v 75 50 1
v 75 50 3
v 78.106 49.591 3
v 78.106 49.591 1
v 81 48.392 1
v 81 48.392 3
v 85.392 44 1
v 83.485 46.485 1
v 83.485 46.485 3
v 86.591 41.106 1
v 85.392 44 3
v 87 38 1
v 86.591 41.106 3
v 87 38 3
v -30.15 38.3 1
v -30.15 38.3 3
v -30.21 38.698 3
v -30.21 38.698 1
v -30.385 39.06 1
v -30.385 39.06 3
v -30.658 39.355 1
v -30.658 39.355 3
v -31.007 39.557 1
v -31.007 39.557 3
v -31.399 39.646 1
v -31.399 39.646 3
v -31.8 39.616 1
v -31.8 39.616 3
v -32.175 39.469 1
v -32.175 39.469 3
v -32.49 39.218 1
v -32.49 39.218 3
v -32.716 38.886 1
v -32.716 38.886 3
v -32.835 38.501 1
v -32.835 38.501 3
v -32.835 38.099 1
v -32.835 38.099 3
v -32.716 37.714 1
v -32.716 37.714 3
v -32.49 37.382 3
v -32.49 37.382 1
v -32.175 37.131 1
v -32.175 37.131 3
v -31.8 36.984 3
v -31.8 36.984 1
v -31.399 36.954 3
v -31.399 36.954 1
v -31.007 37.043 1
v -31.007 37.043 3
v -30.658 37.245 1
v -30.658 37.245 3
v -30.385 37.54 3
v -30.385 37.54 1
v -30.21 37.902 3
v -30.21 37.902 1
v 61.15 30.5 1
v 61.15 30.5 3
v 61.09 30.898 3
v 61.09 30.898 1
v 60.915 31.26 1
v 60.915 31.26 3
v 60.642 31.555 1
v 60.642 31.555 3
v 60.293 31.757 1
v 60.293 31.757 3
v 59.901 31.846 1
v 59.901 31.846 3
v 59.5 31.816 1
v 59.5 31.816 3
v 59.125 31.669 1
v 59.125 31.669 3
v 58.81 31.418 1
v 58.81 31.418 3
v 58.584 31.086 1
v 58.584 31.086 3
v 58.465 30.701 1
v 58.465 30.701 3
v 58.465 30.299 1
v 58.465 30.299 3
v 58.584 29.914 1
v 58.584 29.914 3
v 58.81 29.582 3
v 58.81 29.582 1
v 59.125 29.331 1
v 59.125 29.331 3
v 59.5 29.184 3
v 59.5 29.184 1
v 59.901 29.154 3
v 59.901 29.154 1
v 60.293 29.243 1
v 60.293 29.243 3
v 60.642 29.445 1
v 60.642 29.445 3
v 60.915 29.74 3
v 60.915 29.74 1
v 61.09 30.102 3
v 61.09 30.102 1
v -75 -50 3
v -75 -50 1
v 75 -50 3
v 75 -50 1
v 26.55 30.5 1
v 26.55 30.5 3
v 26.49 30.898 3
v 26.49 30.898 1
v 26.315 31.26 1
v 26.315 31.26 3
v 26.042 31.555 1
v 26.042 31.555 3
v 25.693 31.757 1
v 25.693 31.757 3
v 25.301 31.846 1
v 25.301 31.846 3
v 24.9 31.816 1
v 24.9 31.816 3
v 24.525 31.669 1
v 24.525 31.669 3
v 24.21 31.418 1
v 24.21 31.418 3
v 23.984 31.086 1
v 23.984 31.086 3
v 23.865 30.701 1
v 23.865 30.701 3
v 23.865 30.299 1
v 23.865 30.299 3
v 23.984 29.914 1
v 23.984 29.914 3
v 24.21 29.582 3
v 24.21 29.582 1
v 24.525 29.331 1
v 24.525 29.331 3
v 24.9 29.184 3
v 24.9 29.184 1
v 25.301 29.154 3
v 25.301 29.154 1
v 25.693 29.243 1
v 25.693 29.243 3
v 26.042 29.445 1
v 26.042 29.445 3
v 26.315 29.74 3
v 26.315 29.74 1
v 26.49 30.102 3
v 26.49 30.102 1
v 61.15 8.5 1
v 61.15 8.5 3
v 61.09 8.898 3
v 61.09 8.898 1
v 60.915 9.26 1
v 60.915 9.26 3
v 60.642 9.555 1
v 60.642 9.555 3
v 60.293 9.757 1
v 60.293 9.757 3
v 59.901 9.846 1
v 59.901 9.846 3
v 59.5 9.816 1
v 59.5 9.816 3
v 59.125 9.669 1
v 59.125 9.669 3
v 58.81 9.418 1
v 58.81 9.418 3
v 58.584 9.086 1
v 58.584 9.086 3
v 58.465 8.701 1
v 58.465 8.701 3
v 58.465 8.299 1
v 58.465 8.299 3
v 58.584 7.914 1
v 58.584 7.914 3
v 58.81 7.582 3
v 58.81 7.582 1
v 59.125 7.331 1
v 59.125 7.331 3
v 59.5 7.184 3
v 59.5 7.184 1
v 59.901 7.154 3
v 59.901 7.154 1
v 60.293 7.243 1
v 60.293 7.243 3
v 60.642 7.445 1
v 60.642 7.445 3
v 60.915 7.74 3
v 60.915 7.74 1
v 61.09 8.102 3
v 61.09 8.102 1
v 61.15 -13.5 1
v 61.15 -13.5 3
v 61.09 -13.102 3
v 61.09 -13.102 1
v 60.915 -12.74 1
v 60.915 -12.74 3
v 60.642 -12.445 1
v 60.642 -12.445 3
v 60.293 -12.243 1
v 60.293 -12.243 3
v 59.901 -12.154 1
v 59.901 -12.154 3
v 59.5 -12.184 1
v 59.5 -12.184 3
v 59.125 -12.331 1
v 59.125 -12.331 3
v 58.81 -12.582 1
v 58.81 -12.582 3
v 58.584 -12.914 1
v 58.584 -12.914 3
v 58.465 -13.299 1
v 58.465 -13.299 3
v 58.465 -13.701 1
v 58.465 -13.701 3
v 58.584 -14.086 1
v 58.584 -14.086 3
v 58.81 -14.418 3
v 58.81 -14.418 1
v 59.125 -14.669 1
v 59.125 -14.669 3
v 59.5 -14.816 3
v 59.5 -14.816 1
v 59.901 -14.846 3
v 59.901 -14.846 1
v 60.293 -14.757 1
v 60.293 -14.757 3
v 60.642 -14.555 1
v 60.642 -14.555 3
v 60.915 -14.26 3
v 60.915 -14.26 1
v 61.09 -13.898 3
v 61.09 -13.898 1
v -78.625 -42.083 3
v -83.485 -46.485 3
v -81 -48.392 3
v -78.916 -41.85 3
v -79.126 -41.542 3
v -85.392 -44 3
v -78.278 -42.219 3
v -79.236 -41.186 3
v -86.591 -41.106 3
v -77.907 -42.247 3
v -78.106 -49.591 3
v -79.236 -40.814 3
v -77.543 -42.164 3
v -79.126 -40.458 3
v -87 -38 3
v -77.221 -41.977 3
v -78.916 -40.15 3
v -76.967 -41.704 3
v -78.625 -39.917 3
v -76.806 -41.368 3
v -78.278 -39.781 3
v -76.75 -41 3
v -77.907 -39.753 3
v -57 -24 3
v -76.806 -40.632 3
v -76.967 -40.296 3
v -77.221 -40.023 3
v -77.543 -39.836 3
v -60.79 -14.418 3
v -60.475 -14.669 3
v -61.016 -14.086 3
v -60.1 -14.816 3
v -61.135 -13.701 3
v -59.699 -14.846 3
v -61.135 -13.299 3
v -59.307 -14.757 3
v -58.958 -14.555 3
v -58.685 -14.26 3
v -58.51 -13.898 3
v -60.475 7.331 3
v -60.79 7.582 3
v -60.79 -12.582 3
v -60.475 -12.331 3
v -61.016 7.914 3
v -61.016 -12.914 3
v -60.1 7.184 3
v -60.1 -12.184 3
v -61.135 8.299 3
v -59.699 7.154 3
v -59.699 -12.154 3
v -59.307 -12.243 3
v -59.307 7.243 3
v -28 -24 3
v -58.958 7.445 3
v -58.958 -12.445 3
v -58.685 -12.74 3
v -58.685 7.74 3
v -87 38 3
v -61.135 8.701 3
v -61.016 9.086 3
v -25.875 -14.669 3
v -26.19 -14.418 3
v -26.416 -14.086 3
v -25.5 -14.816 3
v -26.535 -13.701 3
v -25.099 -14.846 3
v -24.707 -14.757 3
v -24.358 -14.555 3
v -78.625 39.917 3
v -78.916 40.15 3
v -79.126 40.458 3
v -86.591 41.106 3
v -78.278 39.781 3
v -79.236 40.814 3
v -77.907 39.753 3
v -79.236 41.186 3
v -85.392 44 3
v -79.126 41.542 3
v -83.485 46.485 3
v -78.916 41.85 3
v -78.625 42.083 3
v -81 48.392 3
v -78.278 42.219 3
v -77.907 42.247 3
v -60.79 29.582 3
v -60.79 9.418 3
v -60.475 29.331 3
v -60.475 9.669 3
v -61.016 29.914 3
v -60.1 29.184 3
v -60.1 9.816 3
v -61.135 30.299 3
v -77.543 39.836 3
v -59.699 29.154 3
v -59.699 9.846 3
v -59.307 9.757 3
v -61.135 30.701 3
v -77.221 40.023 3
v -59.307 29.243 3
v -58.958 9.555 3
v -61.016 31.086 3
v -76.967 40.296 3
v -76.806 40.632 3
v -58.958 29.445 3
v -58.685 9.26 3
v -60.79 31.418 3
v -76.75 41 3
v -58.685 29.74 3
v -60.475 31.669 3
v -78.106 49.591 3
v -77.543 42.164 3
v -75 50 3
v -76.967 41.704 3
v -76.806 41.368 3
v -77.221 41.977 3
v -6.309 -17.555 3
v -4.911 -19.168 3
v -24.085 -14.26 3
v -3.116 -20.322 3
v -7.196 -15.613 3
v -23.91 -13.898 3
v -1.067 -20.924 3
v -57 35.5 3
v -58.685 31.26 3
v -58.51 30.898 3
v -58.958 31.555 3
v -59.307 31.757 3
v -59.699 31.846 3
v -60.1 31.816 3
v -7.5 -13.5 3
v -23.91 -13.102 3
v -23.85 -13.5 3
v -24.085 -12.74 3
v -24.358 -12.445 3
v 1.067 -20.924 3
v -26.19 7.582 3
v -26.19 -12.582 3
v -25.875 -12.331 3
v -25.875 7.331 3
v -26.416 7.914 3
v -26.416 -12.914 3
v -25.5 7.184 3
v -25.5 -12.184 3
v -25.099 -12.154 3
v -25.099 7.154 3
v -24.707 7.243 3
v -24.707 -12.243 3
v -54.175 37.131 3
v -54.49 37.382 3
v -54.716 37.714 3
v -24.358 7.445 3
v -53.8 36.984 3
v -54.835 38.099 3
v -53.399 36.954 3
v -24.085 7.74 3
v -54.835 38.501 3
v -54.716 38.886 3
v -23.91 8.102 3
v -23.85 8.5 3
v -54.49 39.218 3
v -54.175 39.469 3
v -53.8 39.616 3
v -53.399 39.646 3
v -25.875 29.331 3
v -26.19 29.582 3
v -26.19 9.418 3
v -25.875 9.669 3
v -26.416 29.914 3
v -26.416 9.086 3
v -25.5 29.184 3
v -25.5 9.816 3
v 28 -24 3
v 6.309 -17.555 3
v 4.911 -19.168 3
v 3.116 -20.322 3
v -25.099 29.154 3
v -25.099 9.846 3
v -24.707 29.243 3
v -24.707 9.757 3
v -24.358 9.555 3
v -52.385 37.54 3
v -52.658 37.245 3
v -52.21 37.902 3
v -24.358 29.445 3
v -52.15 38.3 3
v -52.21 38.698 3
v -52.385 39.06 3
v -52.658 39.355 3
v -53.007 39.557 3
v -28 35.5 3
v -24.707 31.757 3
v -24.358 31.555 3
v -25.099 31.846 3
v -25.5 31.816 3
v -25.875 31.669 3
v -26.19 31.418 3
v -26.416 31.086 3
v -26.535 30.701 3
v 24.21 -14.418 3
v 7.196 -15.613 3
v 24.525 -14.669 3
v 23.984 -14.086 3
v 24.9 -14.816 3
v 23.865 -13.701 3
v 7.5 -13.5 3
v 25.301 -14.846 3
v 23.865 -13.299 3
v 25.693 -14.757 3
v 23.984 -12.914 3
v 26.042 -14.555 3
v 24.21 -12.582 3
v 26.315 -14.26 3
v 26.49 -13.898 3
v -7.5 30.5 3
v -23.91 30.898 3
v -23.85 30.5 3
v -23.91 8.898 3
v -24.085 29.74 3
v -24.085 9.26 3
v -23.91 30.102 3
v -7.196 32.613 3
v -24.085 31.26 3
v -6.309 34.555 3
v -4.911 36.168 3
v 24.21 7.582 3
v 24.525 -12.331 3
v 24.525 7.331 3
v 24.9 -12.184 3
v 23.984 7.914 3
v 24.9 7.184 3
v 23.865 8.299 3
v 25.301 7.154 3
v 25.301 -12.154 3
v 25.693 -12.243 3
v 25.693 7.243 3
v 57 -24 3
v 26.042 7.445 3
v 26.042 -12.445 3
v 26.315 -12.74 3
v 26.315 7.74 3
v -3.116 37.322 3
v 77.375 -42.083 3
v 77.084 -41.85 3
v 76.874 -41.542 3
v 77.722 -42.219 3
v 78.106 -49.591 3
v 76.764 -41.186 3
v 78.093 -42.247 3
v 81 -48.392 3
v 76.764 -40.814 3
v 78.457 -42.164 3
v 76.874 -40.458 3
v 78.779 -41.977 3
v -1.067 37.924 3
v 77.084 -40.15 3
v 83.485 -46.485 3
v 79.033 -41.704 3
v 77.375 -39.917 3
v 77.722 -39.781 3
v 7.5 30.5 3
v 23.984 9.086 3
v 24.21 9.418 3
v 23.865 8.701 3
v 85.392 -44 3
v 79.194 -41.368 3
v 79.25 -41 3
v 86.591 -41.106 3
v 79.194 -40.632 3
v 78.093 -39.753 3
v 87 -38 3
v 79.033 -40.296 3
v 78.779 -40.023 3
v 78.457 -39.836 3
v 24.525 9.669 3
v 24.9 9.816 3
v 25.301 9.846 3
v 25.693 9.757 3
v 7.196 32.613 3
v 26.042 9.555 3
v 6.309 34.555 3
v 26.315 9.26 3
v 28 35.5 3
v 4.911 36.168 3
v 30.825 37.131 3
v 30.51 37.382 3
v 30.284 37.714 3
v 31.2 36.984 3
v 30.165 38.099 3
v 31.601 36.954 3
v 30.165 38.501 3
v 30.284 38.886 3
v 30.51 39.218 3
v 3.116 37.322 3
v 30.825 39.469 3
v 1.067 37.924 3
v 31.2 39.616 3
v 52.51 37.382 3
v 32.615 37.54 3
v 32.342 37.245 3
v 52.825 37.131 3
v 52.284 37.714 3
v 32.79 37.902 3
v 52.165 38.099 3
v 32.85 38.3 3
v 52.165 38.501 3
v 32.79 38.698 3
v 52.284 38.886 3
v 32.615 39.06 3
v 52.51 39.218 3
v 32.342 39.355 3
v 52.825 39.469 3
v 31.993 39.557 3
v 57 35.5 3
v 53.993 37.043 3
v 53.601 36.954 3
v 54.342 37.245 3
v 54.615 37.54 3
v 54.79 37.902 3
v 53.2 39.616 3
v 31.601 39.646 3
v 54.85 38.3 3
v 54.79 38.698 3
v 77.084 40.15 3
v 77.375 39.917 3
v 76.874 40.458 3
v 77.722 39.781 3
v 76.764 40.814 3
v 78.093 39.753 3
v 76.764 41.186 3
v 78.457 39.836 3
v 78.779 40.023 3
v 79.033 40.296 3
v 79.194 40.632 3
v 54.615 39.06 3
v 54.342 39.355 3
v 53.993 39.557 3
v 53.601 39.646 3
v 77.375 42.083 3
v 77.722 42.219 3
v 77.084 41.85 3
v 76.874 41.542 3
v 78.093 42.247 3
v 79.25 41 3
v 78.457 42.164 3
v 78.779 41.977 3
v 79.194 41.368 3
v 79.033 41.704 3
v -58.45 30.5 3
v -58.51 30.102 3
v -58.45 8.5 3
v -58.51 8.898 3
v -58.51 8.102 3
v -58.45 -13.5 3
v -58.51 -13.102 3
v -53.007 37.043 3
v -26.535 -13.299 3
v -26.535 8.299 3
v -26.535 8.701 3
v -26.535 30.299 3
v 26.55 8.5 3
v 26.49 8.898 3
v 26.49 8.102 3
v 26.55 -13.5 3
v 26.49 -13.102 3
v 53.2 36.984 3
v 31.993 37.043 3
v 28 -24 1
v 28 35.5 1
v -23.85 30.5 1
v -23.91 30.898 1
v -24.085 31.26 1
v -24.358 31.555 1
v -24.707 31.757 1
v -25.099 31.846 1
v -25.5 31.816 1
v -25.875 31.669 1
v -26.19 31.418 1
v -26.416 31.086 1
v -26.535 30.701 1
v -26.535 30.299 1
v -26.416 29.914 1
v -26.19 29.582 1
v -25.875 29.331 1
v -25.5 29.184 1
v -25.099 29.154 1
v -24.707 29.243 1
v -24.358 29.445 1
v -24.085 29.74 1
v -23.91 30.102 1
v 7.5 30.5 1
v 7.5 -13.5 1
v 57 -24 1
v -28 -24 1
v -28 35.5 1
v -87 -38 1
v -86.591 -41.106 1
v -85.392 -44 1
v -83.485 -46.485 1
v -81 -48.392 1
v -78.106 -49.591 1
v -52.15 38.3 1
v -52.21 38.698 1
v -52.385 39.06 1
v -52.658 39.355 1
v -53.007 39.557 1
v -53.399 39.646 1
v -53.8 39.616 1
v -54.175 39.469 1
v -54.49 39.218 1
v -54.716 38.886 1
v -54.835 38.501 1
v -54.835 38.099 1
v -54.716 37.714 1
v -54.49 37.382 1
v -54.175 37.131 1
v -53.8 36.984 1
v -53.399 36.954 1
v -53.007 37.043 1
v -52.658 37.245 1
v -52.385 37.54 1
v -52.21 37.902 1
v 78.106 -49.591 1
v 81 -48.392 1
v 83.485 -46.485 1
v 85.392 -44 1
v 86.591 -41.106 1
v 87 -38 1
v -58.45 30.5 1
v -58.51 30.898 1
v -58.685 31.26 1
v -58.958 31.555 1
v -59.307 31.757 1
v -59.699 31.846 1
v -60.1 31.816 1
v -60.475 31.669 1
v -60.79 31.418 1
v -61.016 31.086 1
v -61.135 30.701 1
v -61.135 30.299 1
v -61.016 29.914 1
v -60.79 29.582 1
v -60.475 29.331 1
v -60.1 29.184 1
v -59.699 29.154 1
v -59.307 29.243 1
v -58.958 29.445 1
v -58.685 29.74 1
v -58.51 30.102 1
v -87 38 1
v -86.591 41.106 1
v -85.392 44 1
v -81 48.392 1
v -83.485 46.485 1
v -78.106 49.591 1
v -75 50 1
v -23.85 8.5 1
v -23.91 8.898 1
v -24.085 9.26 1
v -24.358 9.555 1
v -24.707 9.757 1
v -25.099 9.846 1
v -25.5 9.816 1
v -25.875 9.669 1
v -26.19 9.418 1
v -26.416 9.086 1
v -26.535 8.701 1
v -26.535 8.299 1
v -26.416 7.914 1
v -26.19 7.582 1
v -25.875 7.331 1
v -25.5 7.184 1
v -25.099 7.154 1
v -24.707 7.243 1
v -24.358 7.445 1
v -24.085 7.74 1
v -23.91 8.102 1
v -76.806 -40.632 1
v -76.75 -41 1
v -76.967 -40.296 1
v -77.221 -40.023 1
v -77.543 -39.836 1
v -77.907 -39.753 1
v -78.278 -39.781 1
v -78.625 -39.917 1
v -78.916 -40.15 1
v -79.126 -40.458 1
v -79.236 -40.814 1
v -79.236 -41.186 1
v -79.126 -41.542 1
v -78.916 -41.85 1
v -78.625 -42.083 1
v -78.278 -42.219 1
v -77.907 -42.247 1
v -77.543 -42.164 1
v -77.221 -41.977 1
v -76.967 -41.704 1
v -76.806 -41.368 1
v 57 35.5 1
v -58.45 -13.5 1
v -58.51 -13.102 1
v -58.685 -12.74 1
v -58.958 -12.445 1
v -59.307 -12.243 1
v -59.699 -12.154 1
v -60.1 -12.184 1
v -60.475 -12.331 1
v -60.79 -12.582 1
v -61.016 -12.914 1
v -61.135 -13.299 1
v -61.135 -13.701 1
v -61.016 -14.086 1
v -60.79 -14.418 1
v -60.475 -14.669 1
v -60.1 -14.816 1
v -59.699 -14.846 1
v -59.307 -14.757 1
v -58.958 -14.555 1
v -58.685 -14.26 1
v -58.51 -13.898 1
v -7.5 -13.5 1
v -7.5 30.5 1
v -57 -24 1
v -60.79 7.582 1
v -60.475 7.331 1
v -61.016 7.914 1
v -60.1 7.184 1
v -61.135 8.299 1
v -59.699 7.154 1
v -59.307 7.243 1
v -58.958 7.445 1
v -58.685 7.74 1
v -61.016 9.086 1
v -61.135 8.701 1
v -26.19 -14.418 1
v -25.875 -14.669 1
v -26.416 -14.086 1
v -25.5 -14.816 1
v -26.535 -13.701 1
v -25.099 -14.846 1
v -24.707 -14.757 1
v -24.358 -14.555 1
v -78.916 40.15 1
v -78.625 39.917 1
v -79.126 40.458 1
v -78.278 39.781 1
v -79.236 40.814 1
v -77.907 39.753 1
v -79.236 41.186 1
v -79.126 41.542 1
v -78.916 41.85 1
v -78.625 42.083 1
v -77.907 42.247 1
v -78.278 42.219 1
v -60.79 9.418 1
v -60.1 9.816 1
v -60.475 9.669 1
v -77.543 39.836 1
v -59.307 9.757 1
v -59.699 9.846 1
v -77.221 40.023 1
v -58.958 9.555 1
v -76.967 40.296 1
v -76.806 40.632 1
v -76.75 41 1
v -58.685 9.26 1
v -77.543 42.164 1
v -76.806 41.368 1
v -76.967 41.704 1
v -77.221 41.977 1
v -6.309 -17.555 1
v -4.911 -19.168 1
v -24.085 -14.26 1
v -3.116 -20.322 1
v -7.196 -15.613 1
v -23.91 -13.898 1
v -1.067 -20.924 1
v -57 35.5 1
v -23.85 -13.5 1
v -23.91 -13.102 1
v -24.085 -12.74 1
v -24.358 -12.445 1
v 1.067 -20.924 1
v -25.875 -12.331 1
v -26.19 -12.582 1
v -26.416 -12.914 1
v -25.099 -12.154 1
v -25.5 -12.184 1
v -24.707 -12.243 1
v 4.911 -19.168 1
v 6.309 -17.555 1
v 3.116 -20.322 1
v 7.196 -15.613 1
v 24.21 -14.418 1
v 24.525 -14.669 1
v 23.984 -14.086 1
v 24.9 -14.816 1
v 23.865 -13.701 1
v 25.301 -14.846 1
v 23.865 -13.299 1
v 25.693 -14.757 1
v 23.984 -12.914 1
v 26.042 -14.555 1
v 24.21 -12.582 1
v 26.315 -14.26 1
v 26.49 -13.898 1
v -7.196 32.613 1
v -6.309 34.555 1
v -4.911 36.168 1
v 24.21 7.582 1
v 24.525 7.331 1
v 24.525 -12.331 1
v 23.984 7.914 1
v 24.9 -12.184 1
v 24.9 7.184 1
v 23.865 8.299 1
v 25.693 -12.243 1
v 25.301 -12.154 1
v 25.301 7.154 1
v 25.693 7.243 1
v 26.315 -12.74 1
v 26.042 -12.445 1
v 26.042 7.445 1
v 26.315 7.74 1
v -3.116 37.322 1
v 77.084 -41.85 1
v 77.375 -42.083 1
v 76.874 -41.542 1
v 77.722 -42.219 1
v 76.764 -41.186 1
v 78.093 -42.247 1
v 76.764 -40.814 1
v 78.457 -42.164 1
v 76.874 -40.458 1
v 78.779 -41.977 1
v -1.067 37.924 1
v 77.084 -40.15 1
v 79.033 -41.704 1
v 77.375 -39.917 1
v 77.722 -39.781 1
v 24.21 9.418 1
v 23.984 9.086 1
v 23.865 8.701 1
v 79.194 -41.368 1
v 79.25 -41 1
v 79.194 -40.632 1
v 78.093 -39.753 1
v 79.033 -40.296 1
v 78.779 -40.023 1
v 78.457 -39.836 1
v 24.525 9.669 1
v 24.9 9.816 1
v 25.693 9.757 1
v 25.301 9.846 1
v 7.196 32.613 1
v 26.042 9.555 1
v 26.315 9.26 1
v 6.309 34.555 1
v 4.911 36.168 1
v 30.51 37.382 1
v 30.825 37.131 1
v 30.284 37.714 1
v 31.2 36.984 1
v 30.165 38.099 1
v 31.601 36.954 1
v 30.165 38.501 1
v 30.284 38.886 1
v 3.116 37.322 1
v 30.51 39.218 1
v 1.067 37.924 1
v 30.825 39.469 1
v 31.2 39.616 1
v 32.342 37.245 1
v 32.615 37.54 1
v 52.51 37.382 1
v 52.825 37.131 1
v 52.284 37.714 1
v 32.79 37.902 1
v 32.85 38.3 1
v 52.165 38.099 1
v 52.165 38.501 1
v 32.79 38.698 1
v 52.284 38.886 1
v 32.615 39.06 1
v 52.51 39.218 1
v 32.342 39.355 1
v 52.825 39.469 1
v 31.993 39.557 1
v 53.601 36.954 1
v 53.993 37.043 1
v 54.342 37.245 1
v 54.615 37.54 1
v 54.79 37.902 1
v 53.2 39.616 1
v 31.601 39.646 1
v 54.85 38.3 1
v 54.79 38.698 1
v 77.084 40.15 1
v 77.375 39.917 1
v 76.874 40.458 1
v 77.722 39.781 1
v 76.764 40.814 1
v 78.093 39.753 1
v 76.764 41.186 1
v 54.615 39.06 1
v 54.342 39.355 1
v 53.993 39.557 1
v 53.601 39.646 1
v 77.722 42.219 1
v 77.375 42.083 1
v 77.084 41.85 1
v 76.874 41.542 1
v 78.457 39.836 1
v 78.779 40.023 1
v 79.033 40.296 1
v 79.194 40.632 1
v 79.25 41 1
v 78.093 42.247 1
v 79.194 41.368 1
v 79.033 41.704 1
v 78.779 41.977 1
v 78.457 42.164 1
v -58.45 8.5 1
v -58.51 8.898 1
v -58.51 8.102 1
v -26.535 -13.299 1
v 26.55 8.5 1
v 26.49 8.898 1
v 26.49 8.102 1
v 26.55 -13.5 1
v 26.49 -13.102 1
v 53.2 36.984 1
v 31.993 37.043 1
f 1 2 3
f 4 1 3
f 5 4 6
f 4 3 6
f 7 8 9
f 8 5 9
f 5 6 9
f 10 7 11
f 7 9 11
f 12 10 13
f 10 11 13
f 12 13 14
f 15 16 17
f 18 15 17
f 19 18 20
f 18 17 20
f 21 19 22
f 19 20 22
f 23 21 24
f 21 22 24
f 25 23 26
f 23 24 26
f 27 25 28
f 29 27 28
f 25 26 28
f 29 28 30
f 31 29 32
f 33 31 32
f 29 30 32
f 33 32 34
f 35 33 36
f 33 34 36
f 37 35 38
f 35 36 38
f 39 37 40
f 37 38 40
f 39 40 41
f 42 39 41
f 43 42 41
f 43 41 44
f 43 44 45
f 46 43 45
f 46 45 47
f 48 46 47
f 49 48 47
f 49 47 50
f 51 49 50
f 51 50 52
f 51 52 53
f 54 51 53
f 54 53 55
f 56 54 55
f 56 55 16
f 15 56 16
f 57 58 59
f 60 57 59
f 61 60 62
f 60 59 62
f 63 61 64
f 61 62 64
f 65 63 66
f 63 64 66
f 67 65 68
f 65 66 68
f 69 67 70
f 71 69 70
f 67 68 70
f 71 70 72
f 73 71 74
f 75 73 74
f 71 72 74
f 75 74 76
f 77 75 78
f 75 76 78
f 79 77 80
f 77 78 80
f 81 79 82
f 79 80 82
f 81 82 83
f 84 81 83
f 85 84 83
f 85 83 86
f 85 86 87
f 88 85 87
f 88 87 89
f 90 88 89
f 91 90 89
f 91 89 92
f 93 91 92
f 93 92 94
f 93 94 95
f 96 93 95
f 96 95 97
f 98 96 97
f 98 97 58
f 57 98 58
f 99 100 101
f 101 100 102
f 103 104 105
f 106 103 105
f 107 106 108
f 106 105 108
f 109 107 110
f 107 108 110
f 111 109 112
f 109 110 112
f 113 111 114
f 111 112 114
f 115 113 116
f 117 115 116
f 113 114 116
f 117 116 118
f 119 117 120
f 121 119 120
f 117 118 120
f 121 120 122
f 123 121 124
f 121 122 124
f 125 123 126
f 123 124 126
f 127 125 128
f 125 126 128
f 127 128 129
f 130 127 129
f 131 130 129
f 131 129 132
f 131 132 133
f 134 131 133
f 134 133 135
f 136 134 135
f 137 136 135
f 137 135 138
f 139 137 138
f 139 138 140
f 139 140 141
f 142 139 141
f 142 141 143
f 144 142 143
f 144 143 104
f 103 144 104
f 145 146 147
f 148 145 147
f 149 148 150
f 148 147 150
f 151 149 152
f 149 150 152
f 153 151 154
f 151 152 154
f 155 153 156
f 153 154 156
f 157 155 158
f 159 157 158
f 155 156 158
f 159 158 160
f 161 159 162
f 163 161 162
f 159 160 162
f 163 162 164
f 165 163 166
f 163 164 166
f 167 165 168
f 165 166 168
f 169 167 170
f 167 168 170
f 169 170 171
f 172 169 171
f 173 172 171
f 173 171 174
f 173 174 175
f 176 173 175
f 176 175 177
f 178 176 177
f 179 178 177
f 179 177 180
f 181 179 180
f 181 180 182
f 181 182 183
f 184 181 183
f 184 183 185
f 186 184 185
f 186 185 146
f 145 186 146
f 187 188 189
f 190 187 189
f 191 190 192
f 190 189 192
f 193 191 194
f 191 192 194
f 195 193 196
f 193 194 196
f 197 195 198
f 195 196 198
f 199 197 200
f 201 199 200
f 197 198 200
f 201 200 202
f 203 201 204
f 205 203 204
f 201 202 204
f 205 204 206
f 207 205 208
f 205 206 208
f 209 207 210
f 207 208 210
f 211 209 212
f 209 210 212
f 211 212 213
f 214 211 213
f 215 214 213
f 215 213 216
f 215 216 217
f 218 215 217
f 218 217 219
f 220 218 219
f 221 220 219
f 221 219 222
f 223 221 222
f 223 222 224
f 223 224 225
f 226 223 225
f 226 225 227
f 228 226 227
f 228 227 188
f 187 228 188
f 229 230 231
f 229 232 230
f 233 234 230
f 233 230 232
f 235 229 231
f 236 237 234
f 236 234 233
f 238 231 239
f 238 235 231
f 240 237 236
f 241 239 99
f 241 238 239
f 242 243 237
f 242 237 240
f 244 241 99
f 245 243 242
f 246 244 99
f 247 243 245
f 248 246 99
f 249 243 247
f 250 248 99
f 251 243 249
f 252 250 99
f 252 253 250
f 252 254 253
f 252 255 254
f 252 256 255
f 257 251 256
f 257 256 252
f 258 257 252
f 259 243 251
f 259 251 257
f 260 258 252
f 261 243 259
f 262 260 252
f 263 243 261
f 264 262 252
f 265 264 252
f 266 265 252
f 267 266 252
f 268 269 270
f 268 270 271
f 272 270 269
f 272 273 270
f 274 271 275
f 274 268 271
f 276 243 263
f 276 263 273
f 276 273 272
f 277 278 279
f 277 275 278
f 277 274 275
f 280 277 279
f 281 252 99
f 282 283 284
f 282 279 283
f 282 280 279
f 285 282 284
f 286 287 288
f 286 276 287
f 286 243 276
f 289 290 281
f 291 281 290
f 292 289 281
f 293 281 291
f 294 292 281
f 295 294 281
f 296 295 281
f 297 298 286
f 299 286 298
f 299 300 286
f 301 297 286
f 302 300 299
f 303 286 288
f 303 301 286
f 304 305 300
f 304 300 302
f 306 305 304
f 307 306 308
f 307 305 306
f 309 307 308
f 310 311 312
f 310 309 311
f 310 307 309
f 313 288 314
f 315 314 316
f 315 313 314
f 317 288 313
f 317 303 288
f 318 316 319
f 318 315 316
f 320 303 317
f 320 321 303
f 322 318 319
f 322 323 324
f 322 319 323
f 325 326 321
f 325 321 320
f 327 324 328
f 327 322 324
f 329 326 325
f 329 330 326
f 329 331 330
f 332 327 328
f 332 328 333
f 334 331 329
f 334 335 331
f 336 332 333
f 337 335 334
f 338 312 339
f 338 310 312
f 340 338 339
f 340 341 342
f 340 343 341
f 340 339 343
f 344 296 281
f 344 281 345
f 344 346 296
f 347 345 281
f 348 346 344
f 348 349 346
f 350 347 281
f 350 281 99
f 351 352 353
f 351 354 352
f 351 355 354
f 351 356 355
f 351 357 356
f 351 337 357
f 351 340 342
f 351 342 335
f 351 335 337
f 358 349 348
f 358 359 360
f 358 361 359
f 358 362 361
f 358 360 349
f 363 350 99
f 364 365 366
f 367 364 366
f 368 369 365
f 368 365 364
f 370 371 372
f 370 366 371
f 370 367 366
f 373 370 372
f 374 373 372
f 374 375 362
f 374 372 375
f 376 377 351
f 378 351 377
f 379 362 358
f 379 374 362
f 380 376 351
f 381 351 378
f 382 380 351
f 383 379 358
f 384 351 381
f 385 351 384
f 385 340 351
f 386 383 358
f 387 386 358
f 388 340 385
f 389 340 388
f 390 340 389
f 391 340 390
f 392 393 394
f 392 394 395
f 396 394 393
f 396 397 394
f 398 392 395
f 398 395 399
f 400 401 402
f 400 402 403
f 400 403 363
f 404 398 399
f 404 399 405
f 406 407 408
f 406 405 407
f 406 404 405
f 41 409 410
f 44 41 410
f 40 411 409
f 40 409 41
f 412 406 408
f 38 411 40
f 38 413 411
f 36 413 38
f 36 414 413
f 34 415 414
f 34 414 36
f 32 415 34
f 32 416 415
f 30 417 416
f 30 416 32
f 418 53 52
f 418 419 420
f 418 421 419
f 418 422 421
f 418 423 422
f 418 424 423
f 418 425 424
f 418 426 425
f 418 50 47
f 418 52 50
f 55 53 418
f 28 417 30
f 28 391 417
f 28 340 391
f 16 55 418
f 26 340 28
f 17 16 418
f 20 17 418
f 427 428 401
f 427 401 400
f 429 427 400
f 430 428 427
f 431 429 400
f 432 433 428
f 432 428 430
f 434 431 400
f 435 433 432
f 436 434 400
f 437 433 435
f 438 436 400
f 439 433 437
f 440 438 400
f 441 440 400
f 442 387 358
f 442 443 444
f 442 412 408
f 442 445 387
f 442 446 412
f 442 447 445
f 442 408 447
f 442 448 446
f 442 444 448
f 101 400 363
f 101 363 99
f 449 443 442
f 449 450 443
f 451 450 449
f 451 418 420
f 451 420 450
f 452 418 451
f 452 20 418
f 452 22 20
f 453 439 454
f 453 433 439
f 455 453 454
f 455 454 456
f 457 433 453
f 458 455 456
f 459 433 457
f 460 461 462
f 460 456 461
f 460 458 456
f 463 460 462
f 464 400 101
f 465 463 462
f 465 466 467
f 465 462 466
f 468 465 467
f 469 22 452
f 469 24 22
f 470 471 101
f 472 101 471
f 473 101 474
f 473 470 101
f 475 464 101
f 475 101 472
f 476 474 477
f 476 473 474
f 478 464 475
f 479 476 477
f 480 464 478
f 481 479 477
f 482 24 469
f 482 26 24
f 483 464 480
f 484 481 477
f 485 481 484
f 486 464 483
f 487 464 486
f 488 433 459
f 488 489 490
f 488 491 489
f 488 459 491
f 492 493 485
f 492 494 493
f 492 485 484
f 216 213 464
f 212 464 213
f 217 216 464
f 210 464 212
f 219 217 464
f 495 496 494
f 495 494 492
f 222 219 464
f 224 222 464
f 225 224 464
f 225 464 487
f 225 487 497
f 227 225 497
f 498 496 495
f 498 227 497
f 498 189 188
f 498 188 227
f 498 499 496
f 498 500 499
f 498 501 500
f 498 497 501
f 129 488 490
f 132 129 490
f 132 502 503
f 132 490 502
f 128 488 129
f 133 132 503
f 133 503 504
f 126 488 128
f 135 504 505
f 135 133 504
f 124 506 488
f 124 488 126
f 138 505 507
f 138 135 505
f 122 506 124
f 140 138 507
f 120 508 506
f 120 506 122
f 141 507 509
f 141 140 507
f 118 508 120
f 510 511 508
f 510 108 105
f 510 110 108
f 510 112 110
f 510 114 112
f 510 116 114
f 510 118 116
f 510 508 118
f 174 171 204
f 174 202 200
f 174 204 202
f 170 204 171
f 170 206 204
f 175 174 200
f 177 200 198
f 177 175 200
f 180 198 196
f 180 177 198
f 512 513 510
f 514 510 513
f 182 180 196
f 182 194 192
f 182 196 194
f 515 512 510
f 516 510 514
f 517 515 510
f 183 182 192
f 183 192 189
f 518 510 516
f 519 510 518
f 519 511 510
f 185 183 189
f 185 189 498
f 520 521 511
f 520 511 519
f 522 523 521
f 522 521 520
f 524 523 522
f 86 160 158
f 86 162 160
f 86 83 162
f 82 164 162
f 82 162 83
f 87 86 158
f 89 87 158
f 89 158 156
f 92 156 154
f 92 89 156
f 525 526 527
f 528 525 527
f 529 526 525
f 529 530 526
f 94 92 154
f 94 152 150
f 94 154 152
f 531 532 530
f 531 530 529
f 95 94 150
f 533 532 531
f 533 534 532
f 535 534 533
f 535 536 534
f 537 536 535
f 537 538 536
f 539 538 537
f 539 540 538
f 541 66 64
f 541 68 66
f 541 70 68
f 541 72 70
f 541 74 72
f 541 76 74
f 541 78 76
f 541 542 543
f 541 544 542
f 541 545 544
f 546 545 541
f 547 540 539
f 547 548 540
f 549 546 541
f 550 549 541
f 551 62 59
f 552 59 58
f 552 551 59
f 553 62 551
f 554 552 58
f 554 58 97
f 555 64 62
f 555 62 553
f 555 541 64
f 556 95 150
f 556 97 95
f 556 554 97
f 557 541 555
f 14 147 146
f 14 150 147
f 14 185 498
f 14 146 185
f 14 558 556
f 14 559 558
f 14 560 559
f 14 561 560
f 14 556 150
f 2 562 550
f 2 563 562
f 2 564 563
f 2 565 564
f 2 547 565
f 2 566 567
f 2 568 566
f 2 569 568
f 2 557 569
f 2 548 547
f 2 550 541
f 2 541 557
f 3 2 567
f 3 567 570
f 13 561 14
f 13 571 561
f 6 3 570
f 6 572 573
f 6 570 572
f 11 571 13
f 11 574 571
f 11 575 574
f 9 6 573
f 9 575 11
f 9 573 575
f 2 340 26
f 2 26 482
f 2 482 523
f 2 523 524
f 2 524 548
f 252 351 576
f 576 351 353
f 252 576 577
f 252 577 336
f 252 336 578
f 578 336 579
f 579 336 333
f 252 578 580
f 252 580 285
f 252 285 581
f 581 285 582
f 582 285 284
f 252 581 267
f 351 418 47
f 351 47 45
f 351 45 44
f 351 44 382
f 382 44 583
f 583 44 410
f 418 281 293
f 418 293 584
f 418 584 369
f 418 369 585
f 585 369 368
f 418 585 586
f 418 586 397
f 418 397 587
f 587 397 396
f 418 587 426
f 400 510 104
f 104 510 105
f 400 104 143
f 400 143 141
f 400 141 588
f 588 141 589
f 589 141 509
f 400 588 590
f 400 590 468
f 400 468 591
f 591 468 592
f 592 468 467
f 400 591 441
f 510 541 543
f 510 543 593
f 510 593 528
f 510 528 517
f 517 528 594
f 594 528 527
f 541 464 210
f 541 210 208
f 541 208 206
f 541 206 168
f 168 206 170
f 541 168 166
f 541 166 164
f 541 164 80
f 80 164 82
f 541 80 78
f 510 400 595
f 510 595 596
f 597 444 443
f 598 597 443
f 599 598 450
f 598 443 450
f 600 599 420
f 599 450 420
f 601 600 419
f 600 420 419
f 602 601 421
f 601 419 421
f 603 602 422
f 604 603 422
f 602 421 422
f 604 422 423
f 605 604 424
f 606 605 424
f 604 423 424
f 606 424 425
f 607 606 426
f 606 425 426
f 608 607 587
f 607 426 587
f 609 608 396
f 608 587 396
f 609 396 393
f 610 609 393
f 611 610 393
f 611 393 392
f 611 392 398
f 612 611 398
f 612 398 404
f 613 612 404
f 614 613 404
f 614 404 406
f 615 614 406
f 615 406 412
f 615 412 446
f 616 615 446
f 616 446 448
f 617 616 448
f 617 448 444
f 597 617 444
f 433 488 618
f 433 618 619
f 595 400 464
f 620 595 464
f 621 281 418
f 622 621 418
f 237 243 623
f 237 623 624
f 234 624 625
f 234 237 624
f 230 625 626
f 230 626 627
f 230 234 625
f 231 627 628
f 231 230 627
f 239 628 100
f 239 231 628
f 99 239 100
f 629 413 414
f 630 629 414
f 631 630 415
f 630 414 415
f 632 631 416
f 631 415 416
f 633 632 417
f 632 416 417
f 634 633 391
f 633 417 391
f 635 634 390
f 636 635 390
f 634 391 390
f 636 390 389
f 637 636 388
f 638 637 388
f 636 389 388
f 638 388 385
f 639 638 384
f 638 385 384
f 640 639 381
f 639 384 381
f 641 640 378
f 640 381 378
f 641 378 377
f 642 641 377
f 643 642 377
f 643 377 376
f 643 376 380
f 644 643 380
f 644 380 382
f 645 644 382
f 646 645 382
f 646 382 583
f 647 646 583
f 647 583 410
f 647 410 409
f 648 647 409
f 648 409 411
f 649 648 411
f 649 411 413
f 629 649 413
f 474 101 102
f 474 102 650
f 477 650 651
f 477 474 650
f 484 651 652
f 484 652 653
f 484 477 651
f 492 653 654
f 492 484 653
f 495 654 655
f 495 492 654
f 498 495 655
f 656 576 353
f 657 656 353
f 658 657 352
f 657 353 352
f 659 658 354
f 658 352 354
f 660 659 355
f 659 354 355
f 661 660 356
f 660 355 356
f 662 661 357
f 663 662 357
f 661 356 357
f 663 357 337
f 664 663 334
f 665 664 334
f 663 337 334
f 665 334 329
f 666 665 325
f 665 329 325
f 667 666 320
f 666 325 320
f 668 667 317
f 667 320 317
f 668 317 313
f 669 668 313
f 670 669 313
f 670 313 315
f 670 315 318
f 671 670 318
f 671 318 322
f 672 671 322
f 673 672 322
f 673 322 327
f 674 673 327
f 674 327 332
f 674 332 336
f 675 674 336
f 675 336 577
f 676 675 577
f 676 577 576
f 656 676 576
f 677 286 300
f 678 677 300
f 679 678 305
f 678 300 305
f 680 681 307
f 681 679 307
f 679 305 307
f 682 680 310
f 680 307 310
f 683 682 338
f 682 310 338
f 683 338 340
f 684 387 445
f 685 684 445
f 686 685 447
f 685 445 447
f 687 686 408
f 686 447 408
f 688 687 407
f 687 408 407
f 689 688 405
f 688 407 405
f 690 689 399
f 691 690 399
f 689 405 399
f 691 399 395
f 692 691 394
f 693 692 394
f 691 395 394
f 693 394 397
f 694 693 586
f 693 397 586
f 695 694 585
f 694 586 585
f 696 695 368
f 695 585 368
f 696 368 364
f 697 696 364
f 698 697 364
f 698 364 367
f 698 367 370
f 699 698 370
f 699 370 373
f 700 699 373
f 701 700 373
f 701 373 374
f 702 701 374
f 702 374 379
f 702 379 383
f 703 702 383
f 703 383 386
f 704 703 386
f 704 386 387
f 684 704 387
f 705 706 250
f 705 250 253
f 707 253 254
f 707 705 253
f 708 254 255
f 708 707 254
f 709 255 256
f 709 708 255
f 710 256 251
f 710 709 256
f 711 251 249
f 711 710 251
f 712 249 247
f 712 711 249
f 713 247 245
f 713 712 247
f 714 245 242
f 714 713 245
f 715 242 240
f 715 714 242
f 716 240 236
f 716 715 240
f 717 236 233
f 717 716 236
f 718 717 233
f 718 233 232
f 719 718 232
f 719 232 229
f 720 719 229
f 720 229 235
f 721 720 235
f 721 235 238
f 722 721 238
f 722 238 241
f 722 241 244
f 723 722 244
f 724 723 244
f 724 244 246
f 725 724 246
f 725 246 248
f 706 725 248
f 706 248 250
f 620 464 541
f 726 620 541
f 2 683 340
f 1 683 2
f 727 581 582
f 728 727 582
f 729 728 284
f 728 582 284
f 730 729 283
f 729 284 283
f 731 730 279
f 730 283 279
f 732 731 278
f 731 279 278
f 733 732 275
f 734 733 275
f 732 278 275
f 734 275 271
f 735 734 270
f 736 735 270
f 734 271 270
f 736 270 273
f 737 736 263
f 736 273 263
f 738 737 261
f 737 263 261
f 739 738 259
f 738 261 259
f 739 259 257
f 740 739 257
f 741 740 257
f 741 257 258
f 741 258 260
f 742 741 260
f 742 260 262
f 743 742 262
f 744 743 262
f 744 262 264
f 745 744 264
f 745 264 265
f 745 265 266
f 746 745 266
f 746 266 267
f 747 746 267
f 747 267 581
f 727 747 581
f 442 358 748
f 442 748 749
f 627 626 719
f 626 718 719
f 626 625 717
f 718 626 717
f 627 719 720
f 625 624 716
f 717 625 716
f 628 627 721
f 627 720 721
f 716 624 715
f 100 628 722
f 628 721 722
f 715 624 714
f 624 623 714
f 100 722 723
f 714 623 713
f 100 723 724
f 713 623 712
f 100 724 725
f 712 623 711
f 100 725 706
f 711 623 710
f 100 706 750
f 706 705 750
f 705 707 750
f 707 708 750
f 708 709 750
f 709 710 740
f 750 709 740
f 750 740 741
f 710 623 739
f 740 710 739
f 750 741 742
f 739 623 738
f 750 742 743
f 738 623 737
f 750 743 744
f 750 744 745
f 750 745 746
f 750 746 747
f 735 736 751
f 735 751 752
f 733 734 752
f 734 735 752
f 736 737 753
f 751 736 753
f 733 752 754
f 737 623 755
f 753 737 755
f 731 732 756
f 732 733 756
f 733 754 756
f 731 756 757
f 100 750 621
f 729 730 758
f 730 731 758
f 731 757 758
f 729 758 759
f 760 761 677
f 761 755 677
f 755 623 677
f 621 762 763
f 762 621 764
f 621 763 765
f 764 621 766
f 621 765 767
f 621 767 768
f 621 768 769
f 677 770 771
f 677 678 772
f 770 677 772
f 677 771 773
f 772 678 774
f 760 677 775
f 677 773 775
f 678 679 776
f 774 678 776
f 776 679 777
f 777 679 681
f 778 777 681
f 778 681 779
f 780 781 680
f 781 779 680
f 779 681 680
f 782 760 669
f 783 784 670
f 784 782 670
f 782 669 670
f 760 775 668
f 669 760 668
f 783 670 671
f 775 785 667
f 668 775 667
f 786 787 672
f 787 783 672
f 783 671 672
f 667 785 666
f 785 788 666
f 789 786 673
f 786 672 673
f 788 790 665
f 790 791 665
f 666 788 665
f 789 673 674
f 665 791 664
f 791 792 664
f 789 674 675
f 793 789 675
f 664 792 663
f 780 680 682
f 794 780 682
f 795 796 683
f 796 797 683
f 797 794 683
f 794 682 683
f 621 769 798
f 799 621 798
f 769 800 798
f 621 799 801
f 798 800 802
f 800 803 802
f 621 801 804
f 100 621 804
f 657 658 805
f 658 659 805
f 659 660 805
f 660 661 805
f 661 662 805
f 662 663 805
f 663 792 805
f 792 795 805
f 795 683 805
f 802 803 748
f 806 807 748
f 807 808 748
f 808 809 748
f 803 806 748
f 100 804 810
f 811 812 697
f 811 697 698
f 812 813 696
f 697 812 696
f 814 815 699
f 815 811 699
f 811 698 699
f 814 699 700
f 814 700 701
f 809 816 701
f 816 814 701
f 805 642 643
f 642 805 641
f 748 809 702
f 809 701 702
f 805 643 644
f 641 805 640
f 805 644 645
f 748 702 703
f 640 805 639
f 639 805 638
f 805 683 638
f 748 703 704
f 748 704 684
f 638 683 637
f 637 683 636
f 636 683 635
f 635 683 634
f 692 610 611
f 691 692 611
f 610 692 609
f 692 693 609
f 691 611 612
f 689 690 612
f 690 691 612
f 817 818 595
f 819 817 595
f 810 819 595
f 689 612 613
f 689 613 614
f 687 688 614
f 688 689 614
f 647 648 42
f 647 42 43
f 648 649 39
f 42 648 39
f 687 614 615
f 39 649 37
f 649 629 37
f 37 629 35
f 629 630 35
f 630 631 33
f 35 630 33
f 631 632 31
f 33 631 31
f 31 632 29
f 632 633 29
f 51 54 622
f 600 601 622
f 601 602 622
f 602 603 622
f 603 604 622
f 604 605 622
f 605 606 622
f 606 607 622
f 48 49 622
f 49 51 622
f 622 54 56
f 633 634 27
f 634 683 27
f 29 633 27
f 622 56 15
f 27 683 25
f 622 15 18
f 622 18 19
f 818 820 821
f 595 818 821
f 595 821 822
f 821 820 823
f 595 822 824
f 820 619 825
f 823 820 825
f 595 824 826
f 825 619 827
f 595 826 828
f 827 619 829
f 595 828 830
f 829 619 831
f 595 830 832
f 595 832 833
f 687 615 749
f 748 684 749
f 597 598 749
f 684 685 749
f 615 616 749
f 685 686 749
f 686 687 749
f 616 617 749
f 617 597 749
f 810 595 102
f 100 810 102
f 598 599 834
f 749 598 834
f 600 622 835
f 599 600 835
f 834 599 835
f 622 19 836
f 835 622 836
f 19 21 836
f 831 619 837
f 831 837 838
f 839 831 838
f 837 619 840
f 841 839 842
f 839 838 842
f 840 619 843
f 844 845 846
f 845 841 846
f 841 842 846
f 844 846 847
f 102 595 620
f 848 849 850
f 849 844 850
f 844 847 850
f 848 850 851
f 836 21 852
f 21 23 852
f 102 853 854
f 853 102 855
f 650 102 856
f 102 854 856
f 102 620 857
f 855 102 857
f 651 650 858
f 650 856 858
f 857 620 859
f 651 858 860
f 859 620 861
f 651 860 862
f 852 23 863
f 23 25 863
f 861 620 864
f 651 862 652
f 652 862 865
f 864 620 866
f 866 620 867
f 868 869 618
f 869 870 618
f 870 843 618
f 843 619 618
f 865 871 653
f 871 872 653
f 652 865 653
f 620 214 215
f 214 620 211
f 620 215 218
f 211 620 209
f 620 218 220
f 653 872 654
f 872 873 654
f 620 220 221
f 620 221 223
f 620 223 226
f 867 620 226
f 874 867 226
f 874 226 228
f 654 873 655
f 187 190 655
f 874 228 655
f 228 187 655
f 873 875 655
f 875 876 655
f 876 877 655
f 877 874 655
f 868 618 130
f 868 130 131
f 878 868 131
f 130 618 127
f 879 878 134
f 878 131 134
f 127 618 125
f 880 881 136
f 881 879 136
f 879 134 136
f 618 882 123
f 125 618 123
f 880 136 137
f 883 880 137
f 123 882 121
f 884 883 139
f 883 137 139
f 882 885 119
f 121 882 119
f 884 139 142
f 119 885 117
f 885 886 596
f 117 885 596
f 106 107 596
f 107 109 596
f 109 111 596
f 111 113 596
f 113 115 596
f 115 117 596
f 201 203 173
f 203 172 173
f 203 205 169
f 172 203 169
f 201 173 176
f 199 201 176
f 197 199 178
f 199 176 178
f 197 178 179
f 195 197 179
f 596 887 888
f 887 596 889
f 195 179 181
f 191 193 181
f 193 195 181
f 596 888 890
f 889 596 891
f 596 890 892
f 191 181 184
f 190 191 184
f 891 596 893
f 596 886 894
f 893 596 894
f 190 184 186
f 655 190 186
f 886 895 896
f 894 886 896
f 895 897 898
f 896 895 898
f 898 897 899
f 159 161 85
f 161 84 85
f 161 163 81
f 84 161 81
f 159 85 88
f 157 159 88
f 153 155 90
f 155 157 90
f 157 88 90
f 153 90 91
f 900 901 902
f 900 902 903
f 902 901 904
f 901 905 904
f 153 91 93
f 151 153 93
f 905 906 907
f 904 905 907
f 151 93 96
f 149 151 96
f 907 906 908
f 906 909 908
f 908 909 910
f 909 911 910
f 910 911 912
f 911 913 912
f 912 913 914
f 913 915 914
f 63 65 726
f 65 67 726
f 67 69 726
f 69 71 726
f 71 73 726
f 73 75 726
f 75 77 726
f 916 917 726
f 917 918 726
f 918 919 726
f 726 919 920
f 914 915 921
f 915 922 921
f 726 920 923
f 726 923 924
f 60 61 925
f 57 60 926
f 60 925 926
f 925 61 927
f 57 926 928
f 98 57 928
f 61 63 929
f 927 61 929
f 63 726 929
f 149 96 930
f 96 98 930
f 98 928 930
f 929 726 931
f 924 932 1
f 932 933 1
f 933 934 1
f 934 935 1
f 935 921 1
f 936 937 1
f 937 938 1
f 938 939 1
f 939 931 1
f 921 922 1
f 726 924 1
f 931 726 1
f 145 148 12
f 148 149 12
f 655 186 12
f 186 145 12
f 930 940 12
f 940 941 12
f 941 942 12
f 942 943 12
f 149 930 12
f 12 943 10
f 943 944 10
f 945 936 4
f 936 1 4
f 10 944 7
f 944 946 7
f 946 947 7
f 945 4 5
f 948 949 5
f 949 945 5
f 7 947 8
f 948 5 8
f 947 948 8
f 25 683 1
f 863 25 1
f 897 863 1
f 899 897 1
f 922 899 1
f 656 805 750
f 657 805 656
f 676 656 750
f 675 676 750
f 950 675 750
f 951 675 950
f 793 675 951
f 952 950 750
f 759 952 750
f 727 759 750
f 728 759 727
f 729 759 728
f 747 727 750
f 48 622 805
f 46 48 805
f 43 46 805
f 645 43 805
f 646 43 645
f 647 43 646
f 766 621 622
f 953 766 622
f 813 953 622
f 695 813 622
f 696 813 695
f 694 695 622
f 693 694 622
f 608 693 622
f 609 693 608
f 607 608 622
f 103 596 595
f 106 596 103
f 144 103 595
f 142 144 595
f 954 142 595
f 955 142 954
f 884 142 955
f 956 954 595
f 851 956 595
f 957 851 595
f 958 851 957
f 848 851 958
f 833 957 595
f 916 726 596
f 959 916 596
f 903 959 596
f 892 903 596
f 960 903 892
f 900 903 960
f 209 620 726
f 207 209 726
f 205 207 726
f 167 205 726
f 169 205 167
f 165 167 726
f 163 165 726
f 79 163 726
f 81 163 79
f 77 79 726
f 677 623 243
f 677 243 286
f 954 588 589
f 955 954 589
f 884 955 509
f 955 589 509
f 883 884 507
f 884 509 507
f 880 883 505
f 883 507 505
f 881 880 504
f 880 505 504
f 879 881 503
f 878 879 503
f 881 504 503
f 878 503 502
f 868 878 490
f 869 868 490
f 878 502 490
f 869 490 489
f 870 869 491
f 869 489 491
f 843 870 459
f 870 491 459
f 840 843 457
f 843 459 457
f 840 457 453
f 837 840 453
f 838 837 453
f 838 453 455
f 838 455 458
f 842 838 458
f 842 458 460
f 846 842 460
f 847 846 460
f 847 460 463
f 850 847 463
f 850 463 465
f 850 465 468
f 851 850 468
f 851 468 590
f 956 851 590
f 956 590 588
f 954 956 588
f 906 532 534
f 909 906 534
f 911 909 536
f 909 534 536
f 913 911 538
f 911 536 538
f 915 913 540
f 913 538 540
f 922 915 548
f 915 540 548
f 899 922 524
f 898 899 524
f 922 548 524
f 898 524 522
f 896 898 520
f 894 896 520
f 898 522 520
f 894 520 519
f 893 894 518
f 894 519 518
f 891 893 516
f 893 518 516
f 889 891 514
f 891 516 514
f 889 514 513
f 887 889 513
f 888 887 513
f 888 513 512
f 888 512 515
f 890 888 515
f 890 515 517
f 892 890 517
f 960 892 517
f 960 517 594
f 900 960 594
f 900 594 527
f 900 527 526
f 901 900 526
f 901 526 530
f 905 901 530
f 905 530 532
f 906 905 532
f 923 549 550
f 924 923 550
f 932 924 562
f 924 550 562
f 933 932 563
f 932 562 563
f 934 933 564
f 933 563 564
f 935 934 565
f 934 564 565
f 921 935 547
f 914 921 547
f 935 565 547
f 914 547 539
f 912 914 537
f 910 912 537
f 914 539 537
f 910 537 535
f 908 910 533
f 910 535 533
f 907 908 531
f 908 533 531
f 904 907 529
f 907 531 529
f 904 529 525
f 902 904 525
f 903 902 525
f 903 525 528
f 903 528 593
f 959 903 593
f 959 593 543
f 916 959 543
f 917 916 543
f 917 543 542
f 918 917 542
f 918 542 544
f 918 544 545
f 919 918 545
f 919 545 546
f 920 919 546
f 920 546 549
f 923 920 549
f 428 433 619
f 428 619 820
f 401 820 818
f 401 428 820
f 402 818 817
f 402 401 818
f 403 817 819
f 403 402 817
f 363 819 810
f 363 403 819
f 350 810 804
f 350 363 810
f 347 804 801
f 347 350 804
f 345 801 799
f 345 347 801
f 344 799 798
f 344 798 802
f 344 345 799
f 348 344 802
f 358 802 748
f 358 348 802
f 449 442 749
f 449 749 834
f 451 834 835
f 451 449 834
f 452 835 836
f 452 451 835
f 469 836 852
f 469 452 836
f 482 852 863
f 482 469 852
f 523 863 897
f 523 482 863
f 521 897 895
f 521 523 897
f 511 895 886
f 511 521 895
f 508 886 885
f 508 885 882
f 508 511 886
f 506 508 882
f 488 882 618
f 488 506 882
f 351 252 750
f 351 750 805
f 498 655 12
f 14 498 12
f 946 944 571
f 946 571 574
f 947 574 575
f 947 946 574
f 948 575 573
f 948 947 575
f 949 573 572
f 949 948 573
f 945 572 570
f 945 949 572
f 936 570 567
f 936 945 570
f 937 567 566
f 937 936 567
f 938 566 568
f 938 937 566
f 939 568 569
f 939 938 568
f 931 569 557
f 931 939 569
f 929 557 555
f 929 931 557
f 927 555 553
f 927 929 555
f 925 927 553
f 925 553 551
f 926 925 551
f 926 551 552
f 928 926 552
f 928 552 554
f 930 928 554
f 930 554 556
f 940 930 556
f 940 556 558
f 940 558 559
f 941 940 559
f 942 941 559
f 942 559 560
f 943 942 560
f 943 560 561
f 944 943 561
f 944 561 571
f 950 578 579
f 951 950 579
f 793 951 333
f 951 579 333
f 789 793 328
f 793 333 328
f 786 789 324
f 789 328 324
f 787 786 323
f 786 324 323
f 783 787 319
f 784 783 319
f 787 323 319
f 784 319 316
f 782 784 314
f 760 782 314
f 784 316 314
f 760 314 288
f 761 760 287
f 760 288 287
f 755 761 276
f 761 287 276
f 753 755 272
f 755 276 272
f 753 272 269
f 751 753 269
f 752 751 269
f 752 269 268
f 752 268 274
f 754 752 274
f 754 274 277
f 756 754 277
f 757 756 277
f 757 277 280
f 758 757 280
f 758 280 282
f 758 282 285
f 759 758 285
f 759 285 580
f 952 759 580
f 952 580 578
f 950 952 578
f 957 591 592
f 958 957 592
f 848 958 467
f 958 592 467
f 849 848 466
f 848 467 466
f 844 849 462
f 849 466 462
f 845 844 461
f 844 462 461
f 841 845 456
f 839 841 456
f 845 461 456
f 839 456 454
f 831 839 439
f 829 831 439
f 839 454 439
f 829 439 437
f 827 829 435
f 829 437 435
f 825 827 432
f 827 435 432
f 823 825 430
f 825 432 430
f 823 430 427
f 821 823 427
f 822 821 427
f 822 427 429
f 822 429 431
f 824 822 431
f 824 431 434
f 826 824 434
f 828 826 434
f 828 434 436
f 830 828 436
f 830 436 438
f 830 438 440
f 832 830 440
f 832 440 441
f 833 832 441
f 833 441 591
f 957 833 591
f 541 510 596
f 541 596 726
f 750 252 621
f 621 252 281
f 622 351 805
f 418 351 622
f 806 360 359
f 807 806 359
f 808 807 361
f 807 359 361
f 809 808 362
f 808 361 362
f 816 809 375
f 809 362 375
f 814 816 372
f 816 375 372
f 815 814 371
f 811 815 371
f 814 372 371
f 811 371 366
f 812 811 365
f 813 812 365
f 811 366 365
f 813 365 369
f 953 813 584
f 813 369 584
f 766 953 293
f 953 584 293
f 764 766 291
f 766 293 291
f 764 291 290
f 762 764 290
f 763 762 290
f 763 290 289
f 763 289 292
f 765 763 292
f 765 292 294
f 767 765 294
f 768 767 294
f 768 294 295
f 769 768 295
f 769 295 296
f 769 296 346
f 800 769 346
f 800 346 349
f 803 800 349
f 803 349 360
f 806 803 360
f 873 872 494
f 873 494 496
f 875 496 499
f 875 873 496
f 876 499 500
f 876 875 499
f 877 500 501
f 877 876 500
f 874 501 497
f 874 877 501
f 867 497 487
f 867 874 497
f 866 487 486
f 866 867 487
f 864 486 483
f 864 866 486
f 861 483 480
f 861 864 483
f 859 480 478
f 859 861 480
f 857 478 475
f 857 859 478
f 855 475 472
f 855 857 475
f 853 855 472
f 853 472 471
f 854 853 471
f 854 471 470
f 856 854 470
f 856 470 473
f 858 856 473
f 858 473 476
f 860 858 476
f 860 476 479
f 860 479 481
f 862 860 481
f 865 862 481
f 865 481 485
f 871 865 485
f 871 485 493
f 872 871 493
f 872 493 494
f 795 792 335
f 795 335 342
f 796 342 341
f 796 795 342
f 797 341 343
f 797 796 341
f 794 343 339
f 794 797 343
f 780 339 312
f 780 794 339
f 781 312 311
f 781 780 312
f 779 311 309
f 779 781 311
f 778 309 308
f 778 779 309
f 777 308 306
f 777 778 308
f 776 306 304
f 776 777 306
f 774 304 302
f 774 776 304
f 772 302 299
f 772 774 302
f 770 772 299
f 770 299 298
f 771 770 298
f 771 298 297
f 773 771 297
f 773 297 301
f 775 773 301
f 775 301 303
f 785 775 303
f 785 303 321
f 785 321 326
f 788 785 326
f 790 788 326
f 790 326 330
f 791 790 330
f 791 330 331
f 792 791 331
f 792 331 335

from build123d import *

# Parameters (mm, degrees)
ESBO_O1_W                     = 174
ESBO_O1_H                     = 100
ESBO_O1_R                     = 1.25
RESSALTO_EXTRUS_O1_DEPTH      = 3
FILETE1_R                     = 12
ESBO_O2_R                     = 1.35
ESBO_O2_W                     = 29
ESBO_O2_H                     = 59.5
CORTE_EXTRUS_O1_DEPTH         = 10
CONVERTER_S_LIDO1_OUTLINE_R   = 1.25
CONVERTER_S_LIDO1_OUTLINE_R_2 = 1.35
CONVERTER_S_LIDO1_OUTLINE_W   = 29
CONVERTER_S_LIDO1_OUTLINE_H   = 59.5
CONVERTER_S_LIDO1_DEPTH       = 1


# Read off the part's stored shape, not the designer's step: Converter-Sólido1
with BuildPart() as part:
    # Esboço1 → Ressalto-extrusão1 (new body)
    with BuildSketch(Plane.XY):
        Rectangle(ESBO_O1_W, ESBO_O1_H)
        with Locations((-78, -41)):
            Circle(ESBO_O1_R, mode=Mode.SUBTRACT)
        with Locations((-78, 41)):
            Circle(ESBO_O1_R, mode=Mode.SUBTRACT)
        with Locations((78, 41)):
            Circle(ESBO_O1_R, mode=Mode.SUBTRACT)
        with Locations((78, -41)):
            Circle(ESBO_O1_R, mode=Mode.SUBTRACT)
    extrude(amount=RESSALTO_EXTRUS_O1_DEPTH)

    # Filete1
    filete1_edges = [part.edges().sort_by_distance(p)[0] for p in [
        (87, -50, 1.5),
        (-87, -50, 1.5),
        (-87, 50, 1.5),
        (87, 50, 1.5),
    ]]
    fillet(filete1_edges, radius=FILETE1_R)

    # Esboço2 → Corte-extrusão1 (cut)
    with BuildSketch(Plane.XY.offset(3)):
        with Locations((-59.8, 30.5)):
            Circle(ESBO_O2_R)
        with Locations((-59.8, 8.5)):
            Circle(ESBO_O2_R)
        with Locations((-59.8, -13.5)):
            Circle(ESBO_O2_R)
        with Locations((-25.2, -13.5)):
            Circle(ESBO_O2_R)
        with Locations((-25.2, 8.5)):
            Circle(ESBO_O2_R)
        with Locations((-25.2, 30.5)):
            Circle(ESBO_O2_R)
        with Locations((-53.5, 38.3)):
            Circle(ESBO_O2_R)
        with Locations((-31.5, 38.3)):
            Circle(ESBO_O2_R)
        with Locations((31.5, 38.3)):
            Circle(ESBO_O2_R)
        with Locations((53.5, 38.3)):
            Circle(ESBO_O2_R)
        with Locations((25.2, 30.5)):
            Circle(ESBO_O2_R)
        with Locations((25.2, 8.5)):
            Circle(ESBO_O2_R)
        with Locations((25.2, -13.5)):
            Circle(ESBO_O2_R)
        with Locations((59.8, -13.5)):
            Circle(ESBO_O2_R)
        with Locations((59.8, 8.5)):
            Circle(ESBO_O2_R)
        with Locations((59.8, 30.5)):
            Circle(ESBO_O2_R)
        with Locations((-42.5, 5.75)):
            Rectangle(ESBO_O2_W, ESBO_O2_H)
        with Locations((42.5, 5.75)):
            Rectangle(ESBO_O2_W, ESBO_O2_H)
        with BuildLine():
            Line((7.5, 30.5), (7.5, -13.5))
            ThreePointArc((7.5, -13.5), (0, -21), (-7.5, -13.5))
            Line((-7.5, -13.5), (-7.5, 30.5))
            ThreePointArc((-7.5, 30.5), (0, 38), (7.5, 30.5))
        make_face()
    extrude(amount=-CORTE_EXTRUS_O1_DEPTH, mode=Mode.SUBTRACT)

    # Converter-Sólido1 outline → Converter-Sólido1 (cut)
    with BuildSketch(Plane.XY):
        with BuildLine():
            Line((87, -38), (87, 38))
            ThreePointArc((87, 38), (83.485281374, 46.485281374), (75, 50))
            Line((75, 50), (-75, 50))
            ThreePointArc((-75, 50), (-83.485281374, 46.485281374), (-87, 38))
            Line((-87, 38), (-87, -38))
            ThreePointArc((-87, -38), (-83.485281374, -46.485281374), (-75, -50))
            Line((-75, -50), (75, -50))
            ThreePointArc((75, -50), (83.485281374, -46.485281374), (87, -38))
        make_face()
        with Locations((-78, -41)):
            Circle(CONVERTER_S_LIDO1_OUTLINE_R, mode=Mode.SUBTRACT)
        with Locations((-59.8, -13.5)):
            Circle(CONVERTER_S_LIDO1_OUTLINE_R_2, mode=Mode.SUBTRACT)
        with Locations((-25.2, -13.5)):
            Circle(CONVERTER_S_LIDO1_OUTLINE_R_2, mode=Mode.SUBTRACT)
        with Locations((78, -41)):
            Circle(CONVERTER_S_LIDO1_OUTLINE_R, mode=Mode.SUBTRACT)
        with Locations((25.2, -13.5)):
            Circle(CONVERTER_S_LIDO1_OUTLINE_R_2, mode=Mode.SUBTRACT)
        with Locations((59.8, -13.5)):
            Circle(CONVERTER_S_LIDO1_OUTLINE_R_2, mode=Mode.SUBTRACT)
        with Locations((-59.8, 8.5)):
            Circle(CONVERTER_S_LIDO1_OUTLINE_R_2, mode=Mode.SUBTRACT)
        with Locations((-42.5, 5.75)):
            Rectangle(CONVERTER_S_LIDO1_OUTLINE_W, CONVERTER_S_LIDO1_OUTLINE_H, mode=Mode.SUBTRACT)
        with Locations((-25.2, 8.5)):
            Circle(CONVERTER_S_LIDO1_OUTLINE_R_2, mode=Mode.SUBTRACT)
        with Locations((-59.8, 30.5)):
            Circle(CONVERTER_S_LIDO1_OUTLINE_R_2, mode=Mode.SUBTRACT)
        with Locations((-78, 41)):
            Circle(CONVERTER_S_LIDO1_OUTLINE_R, mode=Mode.SUBTRACT)
        with Locations((-53.5, 38.3)):
            Circle(CONVERTER_S_LIDO1_OUTLINE_R_2, mode=Mode.SUBTRACT)
        with Locations((-25.2, 30.5)):
            Circle(CONVERTER_S_LIDO1_OUTLINE_R_2, mode=Mode.SUBTRACT)
        with Locations((-31.5, 38.3)):
            Circle(CONVERTER_S_LIDO1_OUTLINE_R_2, mode=Mode.SUBTRACT)
        with BuildLine():
            ThreePointArc((-7.5, 30.5), (0, 38), (7.5, 30.5))
            Line((7.5, 30.5), (7.5, -13.5))
            ThreePointArc((7.5, -13.5), (0, -21), (-7.5, -13.5))
            Line((-7.5, -13.5), (-7.5, 30.5))
        make_face(mode=Mode.SUBTRACT)
        with Locations((42.5, 5.75)):
            Rectangle(CONVERTER_S_LIDO1_OUTLINE_W, CONVERTER_S_LIDO1_OUTLINE_H, mode=Mode.SUBTRACT)
        with Locations((25.2, 8.5)):
            Circle(CONVERTER_S_LIDO1_OUTLINE_R_2, mode=Mode.SUBTRACT)
        with Locations((59.8, 8.5)):
            Circle(CONVERTER_S_LIDO1_OUTLINE_R_2, mode=Mode.SUBTRACT)
        with Locations((25.2, 30.5)):
            Circle(CONVERTER_S_LIDO1_OUTLINE_R_2, mode=Mode.SUBTRACT)
        with Locations((31.5, 38.3)):
            Circle(CONVERTER_S_LIDO1_OUTLINE_R_2, mode=Mode.SUBTRACT)
        with Locations((59.8, 30.5)):
            Circle(CONVERTER_S_LIDO1_OUTLINE_R_2, mode=Mode.SUBTRACT)
        with Locations((53.5, 38.3)):
            Circle(CONVERTER_S_LIDO1_OUTLINE_R_2, mode=Mode.SUBTRACT)
        with Locations((78, 41)):
            Circle(CONVERTER_S_LIDO1_OUTLINE_R, mode=Mode.SUBTRACT)
    extrude(amount=CONVERTER_S_LIDO1_DEPTH, mode=Mode.SUBTRACT)


solid = part.part
